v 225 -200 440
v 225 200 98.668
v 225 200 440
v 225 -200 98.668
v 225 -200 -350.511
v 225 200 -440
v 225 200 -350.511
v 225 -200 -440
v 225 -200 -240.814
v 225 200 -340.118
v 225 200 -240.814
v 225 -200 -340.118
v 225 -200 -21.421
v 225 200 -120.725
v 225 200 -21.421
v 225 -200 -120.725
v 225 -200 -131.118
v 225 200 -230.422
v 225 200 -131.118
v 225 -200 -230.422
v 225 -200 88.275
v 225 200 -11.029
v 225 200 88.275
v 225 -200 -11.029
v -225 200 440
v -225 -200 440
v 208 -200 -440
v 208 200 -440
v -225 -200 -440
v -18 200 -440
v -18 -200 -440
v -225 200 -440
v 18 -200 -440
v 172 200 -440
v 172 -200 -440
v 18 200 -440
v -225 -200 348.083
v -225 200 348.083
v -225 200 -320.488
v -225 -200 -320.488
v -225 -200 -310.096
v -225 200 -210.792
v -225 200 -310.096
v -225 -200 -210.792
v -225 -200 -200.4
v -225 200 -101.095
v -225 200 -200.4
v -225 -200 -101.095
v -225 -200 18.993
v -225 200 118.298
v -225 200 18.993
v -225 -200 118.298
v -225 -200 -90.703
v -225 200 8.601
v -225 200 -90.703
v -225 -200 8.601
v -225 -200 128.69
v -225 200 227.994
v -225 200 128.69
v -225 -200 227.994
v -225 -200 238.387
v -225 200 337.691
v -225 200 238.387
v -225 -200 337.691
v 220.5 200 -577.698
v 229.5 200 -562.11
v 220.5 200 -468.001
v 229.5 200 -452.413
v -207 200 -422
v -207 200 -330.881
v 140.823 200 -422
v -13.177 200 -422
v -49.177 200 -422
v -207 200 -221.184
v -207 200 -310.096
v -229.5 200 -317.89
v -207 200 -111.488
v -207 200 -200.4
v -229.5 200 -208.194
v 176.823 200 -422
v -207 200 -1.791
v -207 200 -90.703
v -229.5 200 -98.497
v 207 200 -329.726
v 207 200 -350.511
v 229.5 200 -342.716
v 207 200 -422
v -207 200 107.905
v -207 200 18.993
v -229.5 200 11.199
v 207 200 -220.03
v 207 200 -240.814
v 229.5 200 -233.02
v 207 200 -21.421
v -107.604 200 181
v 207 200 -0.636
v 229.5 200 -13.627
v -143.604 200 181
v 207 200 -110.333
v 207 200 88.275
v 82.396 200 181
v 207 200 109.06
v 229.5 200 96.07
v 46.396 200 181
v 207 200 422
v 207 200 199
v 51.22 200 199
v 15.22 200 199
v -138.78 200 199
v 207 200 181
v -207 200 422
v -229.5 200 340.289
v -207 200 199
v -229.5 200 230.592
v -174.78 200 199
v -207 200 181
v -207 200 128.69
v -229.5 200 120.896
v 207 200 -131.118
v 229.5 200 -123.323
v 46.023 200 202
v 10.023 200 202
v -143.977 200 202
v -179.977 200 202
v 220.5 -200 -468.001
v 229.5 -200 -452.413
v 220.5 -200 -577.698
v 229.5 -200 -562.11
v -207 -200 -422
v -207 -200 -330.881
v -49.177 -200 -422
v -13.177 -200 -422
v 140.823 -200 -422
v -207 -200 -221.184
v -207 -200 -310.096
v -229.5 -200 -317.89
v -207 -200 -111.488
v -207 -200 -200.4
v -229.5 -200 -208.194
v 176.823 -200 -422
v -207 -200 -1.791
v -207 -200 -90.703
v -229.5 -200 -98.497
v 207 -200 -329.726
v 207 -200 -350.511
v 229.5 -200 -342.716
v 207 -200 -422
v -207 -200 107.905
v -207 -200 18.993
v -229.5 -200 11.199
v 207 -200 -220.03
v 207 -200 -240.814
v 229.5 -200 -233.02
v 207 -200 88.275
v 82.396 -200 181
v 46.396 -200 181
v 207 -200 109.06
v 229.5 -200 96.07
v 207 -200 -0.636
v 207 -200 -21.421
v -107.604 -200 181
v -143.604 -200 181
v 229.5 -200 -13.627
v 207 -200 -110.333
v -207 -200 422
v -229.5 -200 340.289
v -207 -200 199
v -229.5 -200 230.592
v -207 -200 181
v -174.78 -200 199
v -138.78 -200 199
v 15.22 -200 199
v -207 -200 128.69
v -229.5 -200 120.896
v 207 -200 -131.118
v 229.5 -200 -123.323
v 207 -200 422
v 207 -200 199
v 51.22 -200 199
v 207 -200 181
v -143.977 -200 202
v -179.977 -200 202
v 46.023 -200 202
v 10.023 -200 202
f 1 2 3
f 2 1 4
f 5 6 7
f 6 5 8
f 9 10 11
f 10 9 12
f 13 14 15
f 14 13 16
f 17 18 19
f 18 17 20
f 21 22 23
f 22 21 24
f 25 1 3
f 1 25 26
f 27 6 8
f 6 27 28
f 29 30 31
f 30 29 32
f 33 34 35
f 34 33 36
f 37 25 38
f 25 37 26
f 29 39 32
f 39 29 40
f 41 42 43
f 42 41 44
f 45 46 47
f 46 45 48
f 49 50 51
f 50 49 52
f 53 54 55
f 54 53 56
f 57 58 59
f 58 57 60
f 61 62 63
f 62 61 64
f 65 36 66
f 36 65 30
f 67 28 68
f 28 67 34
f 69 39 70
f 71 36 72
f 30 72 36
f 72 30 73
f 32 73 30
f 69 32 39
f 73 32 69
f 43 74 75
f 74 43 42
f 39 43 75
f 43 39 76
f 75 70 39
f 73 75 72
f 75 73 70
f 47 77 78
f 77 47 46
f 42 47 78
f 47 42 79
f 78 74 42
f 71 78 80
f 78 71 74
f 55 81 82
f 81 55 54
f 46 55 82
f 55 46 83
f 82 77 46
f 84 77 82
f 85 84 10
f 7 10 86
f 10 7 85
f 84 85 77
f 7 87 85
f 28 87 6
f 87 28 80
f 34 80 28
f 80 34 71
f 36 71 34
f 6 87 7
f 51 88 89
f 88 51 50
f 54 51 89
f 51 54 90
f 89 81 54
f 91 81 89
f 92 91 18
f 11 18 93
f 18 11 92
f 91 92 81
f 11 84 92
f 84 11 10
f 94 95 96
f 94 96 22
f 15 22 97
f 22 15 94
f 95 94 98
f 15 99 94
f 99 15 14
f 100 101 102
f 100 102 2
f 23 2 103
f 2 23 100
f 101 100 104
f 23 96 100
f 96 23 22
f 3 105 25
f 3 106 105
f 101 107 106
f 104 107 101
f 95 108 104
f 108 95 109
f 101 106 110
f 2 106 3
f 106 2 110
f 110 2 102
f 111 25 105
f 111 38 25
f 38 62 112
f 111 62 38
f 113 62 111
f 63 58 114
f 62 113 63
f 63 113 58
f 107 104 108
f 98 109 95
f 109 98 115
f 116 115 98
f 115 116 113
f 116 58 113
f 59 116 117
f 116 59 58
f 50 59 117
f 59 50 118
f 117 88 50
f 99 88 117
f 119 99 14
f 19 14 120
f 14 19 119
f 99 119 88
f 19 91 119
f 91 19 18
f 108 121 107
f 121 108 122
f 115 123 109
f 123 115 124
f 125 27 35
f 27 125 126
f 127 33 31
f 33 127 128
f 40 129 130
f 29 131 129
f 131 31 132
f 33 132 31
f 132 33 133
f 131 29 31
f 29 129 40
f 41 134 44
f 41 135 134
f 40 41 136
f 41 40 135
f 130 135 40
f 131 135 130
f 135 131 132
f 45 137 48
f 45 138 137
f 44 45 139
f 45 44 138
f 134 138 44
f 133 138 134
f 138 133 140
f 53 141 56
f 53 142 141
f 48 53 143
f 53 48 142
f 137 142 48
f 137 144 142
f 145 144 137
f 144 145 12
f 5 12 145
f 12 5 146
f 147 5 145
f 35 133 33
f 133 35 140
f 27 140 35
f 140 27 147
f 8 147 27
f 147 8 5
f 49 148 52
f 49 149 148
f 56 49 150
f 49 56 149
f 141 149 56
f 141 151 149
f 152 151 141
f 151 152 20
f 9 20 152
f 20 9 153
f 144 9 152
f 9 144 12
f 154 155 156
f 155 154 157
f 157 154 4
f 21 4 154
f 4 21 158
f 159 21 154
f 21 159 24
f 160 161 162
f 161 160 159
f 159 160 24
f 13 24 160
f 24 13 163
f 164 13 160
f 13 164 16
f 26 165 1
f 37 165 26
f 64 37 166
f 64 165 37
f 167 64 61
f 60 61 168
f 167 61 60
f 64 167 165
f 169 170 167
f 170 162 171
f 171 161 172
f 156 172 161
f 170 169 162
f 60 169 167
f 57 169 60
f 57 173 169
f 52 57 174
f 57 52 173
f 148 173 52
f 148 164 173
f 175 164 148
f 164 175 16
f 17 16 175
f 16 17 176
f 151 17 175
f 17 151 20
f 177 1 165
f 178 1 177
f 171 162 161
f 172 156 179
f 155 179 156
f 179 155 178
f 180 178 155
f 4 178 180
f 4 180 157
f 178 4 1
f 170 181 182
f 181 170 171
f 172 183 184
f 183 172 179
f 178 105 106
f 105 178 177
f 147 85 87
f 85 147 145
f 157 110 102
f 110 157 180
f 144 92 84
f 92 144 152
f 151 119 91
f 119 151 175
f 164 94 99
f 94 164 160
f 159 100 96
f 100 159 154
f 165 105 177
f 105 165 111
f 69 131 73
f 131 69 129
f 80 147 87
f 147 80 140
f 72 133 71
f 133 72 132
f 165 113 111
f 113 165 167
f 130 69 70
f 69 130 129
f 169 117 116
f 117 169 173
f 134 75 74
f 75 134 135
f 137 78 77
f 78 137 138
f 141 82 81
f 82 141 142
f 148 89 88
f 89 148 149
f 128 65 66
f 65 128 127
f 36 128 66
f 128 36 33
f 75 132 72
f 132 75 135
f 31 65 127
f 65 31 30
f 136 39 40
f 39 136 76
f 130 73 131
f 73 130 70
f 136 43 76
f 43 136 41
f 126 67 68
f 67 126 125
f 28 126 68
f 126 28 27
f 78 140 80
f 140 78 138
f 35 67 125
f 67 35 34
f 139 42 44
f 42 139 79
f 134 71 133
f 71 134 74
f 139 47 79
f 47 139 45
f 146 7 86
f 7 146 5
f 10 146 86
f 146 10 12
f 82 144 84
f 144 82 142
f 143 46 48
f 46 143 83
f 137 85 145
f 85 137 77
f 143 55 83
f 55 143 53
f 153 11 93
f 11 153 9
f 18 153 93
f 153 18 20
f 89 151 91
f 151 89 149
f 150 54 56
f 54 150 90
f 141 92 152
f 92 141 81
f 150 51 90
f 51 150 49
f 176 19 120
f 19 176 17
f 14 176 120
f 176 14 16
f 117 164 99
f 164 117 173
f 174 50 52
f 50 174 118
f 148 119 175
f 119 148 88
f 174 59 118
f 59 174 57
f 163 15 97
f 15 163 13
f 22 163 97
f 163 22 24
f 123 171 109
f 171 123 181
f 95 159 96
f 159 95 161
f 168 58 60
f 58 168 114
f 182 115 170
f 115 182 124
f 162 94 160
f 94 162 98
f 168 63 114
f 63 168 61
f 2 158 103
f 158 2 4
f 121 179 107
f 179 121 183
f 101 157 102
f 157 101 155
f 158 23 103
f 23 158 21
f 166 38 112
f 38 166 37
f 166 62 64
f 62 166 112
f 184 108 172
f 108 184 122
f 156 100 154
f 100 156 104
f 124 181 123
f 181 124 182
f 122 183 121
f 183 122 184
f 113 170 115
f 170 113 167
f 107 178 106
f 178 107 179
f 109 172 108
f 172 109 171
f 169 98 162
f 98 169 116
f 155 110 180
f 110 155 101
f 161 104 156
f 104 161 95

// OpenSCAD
height = 880;
widht = 450;
lenght = 400;

thickness = 18;

angle = 30;

shelf_widht = widht / cos(angle);

nb_of_shelf = shelf_widht / 95;

sperator_height = 25;

difference(){
    cube([widht, lenght, height], true);
    cube([widht - thickness*2, 500, height - thickness*2], true);
}


difference(){
for ( i = [0:1:6])
 translate([0, 0, i*95/cos(angle)])shelf();

translate([0, 0, 327])cube([widht - thickness*2, 500, 250], true);
}



 module shelf(){
translate([0, 0, -height/2])
rotate ([0,angle,0])
    union(){
        cube([shelf_widht, lenght, thickness], true);
     
     for (i = [0 : 1 : nb_of_shelf])
        translate([-95 * i, 0, 0])
        translate([shelf_widht / 2, 0, thickness])
            %cube([thickness, lenght, sperator_height ], true);
    }    
    
}

translate([0, 0, height / 2 -250])cube([widht, lenght, thickness], true);
